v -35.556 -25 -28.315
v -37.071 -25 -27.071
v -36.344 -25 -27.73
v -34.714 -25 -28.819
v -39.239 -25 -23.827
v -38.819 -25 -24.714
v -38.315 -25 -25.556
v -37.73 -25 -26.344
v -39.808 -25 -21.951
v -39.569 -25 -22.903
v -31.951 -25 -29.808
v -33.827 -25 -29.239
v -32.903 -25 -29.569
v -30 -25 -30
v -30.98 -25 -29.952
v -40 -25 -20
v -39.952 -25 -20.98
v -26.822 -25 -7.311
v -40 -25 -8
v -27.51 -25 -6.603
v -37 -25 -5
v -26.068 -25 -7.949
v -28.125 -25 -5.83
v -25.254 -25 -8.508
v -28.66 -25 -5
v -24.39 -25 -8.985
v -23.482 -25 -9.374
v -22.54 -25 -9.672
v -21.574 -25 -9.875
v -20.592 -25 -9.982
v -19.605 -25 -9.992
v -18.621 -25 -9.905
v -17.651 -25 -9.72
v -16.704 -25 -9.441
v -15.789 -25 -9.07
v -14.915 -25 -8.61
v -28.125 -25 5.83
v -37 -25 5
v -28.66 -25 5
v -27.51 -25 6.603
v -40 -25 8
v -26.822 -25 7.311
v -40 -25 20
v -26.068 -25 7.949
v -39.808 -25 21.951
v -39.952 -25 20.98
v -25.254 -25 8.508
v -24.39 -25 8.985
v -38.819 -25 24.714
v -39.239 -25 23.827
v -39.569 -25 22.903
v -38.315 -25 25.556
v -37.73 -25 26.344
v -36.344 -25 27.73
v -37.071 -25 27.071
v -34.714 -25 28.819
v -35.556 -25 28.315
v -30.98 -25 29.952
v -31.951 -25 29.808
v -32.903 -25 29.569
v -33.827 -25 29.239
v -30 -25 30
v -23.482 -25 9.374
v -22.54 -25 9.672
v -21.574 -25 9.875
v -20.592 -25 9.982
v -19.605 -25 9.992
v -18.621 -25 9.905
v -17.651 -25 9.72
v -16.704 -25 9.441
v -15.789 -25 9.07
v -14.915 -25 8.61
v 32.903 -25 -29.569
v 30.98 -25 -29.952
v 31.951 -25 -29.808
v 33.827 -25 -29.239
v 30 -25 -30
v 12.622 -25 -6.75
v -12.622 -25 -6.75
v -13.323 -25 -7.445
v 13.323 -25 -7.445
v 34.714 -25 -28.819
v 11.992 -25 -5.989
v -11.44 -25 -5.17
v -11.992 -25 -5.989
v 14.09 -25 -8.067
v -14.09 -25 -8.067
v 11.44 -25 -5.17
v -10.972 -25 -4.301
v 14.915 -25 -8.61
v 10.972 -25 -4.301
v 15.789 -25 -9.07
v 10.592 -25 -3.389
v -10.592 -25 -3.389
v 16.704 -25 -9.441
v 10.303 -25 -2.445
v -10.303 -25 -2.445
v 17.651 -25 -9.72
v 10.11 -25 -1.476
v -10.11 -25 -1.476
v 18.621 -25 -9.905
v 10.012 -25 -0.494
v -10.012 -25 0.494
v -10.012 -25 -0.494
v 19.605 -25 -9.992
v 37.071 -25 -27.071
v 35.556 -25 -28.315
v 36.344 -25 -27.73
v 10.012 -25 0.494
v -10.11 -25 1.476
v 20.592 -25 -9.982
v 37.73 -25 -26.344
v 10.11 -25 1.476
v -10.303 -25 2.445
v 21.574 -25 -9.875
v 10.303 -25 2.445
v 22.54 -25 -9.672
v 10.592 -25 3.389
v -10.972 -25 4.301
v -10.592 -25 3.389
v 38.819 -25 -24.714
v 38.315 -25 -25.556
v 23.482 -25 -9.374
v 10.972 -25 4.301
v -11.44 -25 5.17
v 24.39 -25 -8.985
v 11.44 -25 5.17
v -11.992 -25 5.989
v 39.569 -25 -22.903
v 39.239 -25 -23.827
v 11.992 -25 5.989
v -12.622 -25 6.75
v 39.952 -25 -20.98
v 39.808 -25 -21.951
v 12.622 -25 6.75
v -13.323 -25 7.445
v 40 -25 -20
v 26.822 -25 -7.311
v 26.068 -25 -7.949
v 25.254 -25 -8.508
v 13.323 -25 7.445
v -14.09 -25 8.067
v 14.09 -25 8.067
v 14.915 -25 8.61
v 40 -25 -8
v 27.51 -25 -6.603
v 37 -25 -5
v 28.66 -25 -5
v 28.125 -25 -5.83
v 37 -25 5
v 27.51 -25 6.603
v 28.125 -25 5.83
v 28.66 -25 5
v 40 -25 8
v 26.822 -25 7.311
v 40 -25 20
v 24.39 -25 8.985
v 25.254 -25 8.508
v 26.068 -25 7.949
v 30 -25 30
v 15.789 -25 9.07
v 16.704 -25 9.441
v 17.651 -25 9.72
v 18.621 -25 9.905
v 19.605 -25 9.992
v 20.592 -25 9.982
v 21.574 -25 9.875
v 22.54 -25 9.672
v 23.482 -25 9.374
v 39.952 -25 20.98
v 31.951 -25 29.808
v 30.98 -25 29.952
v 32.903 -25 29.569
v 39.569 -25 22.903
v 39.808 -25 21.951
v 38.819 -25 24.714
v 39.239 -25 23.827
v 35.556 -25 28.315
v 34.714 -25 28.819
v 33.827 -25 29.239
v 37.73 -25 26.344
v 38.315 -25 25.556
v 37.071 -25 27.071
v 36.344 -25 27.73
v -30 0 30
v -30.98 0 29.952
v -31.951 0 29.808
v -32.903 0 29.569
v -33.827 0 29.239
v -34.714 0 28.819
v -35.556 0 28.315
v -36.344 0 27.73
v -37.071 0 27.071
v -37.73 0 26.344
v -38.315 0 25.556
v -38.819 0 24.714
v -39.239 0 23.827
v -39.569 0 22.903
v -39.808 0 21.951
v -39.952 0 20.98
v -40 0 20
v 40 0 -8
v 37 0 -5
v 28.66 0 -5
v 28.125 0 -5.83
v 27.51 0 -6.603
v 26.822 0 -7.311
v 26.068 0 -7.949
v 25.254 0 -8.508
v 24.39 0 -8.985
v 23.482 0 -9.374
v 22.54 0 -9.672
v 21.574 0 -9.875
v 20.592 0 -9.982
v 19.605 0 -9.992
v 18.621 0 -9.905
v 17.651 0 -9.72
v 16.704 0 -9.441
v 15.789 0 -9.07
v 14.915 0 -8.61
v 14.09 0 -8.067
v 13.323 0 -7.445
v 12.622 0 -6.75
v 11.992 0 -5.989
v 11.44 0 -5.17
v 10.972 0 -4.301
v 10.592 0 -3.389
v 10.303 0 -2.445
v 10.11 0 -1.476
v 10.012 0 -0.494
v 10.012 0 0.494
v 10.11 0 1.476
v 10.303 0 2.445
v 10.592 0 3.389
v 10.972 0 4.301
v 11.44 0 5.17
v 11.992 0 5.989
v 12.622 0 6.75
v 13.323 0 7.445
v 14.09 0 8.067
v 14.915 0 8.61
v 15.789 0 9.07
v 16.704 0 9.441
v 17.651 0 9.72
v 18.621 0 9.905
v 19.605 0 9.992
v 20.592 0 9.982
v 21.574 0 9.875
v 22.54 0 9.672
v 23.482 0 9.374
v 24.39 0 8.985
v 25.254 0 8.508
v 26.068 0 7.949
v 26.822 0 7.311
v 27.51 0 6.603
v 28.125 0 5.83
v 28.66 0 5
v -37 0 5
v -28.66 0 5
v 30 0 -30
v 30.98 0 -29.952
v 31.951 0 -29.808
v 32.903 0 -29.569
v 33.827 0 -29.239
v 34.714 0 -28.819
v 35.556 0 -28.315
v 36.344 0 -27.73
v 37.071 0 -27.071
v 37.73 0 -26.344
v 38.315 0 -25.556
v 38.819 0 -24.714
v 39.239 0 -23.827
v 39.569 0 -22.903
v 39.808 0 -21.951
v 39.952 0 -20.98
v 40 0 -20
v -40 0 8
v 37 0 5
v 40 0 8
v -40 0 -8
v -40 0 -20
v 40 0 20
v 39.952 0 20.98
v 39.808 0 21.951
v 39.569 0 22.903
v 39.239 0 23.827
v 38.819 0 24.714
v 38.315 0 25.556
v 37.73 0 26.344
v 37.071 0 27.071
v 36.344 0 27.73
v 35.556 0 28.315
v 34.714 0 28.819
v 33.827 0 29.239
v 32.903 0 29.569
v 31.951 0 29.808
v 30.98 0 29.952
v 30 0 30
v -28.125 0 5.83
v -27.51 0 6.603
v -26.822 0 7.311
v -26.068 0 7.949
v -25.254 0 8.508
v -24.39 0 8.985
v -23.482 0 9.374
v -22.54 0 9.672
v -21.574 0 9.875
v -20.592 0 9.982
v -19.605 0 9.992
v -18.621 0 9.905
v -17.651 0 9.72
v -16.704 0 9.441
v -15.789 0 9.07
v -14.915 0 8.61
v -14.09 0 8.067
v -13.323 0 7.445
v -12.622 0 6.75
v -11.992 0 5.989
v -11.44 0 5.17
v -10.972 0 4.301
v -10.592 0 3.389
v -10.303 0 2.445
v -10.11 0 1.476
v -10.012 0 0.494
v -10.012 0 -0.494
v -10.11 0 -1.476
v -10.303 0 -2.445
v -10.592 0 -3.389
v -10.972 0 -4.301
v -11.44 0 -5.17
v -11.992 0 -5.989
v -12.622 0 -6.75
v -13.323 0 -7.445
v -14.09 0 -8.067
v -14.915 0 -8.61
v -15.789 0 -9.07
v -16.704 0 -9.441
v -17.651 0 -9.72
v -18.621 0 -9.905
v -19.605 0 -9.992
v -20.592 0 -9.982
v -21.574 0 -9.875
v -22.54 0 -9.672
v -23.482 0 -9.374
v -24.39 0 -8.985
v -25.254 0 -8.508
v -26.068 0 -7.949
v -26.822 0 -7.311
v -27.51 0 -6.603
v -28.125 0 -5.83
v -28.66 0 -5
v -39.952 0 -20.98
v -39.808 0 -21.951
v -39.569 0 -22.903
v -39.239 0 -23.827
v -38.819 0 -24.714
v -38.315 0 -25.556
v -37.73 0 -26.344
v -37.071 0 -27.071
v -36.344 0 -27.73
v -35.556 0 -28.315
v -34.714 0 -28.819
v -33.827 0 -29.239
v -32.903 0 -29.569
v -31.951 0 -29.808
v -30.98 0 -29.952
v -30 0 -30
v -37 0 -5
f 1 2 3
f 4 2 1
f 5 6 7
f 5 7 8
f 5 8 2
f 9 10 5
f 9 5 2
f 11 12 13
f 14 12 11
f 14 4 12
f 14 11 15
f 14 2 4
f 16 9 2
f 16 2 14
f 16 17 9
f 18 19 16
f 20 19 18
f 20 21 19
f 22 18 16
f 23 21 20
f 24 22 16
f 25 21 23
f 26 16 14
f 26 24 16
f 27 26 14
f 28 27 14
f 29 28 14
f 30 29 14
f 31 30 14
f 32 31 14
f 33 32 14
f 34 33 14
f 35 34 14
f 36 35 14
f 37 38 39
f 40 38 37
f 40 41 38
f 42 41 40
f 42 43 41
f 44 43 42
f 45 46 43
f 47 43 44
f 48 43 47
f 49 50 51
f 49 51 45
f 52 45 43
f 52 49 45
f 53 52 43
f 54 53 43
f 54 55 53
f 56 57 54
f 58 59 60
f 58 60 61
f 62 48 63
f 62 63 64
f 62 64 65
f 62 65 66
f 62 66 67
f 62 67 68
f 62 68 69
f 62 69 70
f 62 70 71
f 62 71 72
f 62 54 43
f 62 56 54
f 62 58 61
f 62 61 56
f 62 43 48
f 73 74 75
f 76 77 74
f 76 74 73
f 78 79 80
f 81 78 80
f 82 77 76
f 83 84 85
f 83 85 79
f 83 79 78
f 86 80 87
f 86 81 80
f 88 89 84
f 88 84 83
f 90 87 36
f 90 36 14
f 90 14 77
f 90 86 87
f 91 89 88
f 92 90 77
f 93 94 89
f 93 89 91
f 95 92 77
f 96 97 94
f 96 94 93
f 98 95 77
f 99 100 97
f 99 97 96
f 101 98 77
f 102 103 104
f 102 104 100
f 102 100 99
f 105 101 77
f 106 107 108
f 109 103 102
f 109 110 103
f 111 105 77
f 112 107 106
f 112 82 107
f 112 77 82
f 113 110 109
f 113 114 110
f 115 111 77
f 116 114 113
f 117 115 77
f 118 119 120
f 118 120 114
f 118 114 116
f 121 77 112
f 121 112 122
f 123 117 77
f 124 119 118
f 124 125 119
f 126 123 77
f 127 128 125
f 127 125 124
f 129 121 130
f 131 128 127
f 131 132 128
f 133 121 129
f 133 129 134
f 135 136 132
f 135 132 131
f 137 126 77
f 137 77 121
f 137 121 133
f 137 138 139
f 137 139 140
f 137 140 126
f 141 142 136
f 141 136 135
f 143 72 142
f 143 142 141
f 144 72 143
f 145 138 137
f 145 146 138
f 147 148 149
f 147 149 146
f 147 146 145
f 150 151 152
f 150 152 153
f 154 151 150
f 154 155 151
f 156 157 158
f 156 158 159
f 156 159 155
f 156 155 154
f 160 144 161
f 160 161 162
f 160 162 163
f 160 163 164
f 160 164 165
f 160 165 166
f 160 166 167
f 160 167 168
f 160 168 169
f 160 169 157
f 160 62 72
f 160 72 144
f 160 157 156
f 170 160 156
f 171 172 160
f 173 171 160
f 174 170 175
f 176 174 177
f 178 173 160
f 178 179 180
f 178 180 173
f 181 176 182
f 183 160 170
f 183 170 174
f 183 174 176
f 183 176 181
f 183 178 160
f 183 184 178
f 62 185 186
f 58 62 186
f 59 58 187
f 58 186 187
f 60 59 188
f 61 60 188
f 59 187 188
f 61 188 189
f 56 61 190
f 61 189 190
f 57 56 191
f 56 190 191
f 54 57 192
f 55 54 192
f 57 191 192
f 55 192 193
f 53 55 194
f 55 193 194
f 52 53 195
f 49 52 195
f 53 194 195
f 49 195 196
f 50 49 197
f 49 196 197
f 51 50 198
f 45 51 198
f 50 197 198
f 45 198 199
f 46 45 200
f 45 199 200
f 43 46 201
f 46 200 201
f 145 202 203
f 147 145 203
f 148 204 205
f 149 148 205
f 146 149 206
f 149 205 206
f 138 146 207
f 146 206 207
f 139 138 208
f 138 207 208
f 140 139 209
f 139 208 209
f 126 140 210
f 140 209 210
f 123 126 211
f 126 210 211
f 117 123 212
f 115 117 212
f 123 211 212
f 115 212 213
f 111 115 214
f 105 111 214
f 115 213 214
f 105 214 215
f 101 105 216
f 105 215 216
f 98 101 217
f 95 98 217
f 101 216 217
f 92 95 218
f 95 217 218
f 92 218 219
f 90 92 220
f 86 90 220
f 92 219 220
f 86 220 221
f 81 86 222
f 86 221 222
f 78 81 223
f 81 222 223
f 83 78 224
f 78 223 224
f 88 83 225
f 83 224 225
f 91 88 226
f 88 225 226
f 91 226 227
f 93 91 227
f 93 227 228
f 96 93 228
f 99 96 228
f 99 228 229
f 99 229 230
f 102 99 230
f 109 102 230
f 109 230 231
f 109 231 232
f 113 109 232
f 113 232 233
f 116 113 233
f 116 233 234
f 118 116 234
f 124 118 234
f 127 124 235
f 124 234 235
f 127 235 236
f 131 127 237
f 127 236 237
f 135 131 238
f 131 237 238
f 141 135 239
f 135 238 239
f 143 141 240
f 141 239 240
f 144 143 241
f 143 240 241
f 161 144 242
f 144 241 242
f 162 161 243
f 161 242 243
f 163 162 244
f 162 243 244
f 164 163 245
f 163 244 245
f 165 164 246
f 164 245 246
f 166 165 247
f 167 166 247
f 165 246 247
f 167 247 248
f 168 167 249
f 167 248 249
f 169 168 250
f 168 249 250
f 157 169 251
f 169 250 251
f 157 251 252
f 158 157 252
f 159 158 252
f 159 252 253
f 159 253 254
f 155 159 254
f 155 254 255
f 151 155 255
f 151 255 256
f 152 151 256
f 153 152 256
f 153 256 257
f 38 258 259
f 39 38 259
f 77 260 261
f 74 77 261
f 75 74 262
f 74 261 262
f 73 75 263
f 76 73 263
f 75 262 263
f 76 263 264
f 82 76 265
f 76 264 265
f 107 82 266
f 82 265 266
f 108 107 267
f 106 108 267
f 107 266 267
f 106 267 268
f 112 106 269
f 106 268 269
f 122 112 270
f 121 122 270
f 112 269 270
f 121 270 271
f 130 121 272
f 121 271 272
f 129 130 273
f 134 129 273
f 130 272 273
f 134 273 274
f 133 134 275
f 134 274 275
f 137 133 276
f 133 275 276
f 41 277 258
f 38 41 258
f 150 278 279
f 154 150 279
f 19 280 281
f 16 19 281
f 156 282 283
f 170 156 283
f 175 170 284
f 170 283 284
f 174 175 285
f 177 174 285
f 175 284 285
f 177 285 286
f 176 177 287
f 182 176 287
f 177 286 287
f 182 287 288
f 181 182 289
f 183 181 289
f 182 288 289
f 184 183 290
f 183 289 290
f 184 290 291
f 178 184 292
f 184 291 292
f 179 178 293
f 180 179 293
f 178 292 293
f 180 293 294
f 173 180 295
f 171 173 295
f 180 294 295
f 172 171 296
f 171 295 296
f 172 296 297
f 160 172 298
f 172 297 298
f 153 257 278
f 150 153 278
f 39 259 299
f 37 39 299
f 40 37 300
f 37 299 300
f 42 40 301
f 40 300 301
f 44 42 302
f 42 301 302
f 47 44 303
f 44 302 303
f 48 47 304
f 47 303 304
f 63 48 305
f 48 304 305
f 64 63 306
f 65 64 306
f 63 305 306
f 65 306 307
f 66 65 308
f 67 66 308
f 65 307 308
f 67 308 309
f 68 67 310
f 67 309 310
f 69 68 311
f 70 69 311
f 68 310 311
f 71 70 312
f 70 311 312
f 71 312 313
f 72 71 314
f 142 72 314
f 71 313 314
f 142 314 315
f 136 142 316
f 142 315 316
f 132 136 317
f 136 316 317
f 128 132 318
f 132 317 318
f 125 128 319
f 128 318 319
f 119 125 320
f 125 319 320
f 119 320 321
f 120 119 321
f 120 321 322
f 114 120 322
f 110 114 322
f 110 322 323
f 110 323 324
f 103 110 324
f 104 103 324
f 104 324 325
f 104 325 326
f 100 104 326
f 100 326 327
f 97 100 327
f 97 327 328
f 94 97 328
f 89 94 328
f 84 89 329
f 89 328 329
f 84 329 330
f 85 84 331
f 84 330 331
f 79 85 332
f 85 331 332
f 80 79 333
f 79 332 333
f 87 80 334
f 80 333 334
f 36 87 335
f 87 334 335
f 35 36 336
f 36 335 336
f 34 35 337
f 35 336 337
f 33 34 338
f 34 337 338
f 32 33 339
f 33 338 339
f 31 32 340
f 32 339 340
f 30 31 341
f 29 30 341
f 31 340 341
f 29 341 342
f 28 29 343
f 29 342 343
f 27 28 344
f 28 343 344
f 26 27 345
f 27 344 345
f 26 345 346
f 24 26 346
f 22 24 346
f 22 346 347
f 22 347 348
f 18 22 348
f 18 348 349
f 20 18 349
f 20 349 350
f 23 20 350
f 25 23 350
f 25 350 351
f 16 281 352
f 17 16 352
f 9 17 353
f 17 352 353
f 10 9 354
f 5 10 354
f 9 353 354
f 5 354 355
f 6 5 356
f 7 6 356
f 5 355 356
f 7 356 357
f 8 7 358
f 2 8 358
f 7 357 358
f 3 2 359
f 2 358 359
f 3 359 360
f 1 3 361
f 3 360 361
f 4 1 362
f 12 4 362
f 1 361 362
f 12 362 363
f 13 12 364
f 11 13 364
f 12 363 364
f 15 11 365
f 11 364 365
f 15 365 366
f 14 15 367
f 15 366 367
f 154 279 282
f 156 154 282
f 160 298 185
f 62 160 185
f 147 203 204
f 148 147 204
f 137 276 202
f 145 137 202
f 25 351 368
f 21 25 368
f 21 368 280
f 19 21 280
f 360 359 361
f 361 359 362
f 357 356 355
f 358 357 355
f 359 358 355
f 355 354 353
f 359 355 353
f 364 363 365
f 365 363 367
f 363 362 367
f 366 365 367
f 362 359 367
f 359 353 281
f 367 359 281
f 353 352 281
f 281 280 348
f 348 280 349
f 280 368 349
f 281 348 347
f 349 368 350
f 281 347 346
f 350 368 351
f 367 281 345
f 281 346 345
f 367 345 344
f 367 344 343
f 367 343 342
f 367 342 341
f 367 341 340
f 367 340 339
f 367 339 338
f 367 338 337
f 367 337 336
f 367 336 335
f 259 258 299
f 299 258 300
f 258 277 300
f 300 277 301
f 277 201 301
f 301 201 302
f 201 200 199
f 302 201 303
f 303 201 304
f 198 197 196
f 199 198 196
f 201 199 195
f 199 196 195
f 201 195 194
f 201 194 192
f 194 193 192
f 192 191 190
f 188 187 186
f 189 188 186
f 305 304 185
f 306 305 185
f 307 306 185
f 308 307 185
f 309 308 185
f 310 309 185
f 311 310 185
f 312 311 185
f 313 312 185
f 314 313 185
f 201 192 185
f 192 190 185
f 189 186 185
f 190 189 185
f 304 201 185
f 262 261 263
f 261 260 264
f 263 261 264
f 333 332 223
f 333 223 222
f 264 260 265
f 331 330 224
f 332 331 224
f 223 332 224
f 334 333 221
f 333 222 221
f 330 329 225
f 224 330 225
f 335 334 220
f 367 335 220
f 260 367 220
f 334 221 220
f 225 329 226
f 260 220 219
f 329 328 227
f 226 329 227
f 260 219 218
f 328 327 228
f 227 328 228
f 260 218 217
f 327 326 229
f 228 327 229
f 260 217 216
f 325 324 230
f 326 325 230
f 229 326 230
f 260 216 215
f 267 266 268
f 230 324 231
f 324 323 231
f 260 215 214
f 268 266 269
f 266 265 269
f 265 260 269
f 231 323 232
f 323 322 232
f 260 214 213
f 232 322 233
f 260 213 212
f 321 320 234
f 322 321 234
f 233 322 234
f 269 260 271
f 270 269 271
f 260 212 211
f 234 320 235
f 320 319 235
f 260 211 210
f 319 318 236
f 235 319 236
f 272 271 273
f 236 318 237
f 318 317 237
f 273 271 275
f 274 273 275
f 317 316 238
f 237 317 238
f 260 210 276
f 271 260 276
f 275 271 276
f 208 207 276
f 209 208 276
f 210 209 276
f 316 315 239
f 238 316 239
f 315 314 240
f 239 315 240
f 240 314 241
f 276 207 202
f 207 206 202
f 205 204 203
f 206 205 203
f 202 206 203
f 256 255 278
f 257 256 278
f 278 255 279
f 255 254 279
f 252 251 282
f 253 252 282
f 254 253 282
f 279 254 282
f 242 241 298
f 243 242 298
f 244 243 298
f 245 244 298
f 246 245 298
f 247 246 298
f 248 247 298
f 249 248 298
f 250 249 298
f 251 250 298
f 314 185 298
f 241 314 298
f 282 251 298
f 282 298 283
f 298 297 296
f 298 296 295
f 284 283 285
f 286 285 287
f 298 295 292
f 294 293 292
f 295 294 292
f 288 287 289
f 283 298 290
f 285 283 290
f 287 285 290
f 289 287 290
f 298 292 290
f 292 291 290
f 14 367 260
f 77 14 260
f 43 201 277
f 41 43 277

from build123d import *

# Parameters (mm, degrees)
F1_DEPTH = 25


with BuildPart() as f1:
    # F0 (on Front) → F1 (new body)
    with BuildSketch(Plane.XZ):
        with BuildLine():
            ThreePointArc((-28.660254, 5), (-10, 0), (-28.660254, -5))
            Line((-28.660254, -5), (-37, -5))
            Line((-37, -5), (-40, -8))
            Line((-40, -8), (-40, -20))
            ThreePointArc((-40, -20), (-37.071068, -27.071068), (-30, -30))
            Line((-30, -30), (0, -30))
            Line((0, -30), (30, -30))
            ThreePointArc((30, -30), (37.071068, -27.071068), (40, -20))
            Line((40, -20), (40, -8))
            Line((40, -8), (37, -5))
            Line((37, -5), (28.660254, -5))
            ThreePointArc((28.660254, -5), (10, 0), (28.660254, 5))
            Line((28.660254, 5), (37, 5))
            Line((37, 5), (40, 8))
            Line((40, 8), (40, 20))
            ThreePointArc((40, 20), (37.071068, 27.071068), (30, 30))
            Line((30, 30), (0, 30))
            Line((0, 30), (-30, 30))
            ThreePointArc((-30, 30), (-37.071068, 27.071068), (-40, 20))
            Line((-40, 20), (-40, 8))
            Line((-40, 8), (-37, 5))
            Line((-37, 5), (-28.660254, 5))
        make_face()
    extrude(amount=F1_DEPTH)


solid = f1.part
